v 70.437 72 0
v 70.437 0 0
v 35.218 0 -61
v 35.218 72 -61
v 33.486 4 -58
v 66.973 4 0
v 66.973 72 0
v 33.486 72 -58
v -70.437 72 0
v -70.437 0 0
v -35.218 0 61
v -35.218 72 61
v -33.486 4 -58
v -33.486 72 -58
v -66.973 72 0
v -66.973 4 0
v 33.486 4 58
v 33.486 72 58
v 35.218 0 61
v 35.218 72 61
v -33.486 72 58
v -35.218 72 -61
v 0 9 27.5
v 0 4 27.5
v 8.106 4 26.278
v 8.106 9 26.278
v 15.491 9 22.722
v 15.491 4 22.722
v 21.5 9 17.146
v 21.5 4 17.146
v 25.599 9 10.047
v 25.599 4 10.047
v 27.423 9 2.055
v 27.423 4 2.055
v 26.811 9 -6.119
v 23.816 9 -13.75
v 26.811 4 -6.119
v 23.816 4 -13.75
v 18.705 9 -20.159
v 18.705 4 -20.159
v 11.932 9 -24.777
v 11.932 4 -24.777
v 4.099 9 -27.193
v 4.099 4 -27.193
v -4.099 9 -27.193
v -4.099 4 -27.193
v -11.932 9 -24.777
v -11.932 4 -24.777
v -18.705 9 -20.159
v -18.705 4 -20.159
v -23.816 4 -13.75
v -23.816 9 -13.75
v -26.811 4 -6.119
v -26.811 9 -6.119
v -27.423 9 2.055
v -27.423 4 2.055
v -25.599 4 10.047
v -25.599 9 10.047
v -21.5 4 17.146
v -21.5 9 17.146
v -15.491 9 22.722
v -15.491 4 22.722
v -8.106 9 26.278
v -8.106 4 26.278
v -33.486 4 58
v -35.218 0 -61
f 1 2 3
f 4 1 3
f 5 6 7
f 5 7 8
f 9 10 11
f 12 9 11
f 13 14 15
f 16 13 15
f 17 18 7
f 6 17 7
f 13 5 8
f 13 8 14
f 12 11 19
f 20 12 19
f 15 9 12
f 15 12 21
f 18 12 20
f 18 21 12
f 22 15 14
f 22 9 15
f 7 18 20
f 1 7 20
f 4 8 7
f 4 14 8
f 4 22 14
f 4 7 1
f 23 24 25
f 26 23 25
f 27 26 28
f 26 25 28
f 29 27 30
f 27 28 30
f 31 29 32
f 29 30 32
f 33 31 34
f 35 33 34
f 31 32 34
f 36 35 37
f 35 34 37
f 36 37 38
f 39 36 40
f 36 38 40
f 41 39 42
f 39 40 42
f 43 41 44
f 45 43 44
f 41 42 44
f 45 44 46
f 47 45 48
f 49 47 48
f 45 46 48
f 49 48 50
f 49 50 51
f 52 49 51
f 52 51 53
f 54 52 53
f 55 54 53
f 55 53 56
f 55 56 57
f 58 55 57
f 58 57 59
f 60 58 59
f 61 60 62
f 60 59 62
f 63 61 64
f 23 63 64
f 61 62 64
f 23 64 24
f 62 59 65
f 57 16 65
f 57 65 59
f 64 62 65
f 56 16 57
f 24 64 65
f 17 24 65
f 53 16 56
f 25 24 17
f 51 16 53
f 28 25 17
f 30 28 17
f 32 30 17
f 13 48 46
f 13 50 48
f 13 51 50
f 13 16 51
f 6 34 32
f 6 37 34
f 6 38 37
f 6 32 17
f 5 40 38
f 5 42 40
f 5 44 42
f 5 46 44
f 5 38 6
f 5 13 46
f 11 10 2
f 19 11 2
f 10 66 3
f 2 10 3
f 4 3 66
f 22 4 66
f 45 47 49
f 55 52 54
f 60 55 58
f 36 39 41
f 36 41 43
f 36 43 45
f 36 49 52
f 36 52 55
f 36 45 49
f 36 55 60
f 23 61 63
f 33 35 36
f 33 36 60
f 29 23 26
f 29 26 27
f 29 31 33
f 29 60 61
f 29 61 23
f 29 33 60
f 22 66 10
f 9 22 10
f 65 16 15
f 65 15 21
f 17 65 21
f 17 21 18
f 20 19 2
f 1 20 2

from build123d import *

# Parameters (mm, degrees)
BOSS_EXTRUDE1_DEPTH = 72
CUT_EXTRUDE1_DEPTH  = 68
SKETCH4_R           = 27.5
BOSS_EXTRUDE2_DEPTH = 5


with BuildPart() as part:
    # Sketch2 → Boss-Extrude1 (new body)
    with BuildSketch(Plane(origin=(0, 0, 0), x_dir=(1, 0, 0), z_dir=(0, 1, 0))):
        Polygon((70.436732841, 0), (35.218366421, 61), (-35.218366421, 61), (-70.436732841, 0), (-35.218366421, -61), (35.218366421, -61), align=None)
    extrude(amount=BOSS_EXTRUDE1_DEPTH)

    # Sketch3 → Cut-Extrude1 (cut)
    with BuildSketch(Plane(origin=(0, 72, 0), x_dir=(1, 0, 0), z_dir=(0, 1, 0))):
        Polygon((66.972631226, 0), (33.486315613, 58), (-33.486315613, 58), (-66.972631226, 0), (-33.486315613, -58), (33.486315613, -58), align=None)
    extrude(amount=-CUT_EXTRUDE1_DEPTH, mode=Mode.SUBTRACT)

    # Sketch4 → Boss-Extrude2 (add)
    with BuildSketch(Plane(origin=(0, 4, 0), x_dir=(1, 0, 0), z_dir=(0, 1, 0))):
        with Locations(Location((0, 0, 0), (0, 0, 270))):
            Circle(SKETCH4_R)
    extrude(amount=BOSS_EXTRUDE2_DEPTH)


solid = part.part
